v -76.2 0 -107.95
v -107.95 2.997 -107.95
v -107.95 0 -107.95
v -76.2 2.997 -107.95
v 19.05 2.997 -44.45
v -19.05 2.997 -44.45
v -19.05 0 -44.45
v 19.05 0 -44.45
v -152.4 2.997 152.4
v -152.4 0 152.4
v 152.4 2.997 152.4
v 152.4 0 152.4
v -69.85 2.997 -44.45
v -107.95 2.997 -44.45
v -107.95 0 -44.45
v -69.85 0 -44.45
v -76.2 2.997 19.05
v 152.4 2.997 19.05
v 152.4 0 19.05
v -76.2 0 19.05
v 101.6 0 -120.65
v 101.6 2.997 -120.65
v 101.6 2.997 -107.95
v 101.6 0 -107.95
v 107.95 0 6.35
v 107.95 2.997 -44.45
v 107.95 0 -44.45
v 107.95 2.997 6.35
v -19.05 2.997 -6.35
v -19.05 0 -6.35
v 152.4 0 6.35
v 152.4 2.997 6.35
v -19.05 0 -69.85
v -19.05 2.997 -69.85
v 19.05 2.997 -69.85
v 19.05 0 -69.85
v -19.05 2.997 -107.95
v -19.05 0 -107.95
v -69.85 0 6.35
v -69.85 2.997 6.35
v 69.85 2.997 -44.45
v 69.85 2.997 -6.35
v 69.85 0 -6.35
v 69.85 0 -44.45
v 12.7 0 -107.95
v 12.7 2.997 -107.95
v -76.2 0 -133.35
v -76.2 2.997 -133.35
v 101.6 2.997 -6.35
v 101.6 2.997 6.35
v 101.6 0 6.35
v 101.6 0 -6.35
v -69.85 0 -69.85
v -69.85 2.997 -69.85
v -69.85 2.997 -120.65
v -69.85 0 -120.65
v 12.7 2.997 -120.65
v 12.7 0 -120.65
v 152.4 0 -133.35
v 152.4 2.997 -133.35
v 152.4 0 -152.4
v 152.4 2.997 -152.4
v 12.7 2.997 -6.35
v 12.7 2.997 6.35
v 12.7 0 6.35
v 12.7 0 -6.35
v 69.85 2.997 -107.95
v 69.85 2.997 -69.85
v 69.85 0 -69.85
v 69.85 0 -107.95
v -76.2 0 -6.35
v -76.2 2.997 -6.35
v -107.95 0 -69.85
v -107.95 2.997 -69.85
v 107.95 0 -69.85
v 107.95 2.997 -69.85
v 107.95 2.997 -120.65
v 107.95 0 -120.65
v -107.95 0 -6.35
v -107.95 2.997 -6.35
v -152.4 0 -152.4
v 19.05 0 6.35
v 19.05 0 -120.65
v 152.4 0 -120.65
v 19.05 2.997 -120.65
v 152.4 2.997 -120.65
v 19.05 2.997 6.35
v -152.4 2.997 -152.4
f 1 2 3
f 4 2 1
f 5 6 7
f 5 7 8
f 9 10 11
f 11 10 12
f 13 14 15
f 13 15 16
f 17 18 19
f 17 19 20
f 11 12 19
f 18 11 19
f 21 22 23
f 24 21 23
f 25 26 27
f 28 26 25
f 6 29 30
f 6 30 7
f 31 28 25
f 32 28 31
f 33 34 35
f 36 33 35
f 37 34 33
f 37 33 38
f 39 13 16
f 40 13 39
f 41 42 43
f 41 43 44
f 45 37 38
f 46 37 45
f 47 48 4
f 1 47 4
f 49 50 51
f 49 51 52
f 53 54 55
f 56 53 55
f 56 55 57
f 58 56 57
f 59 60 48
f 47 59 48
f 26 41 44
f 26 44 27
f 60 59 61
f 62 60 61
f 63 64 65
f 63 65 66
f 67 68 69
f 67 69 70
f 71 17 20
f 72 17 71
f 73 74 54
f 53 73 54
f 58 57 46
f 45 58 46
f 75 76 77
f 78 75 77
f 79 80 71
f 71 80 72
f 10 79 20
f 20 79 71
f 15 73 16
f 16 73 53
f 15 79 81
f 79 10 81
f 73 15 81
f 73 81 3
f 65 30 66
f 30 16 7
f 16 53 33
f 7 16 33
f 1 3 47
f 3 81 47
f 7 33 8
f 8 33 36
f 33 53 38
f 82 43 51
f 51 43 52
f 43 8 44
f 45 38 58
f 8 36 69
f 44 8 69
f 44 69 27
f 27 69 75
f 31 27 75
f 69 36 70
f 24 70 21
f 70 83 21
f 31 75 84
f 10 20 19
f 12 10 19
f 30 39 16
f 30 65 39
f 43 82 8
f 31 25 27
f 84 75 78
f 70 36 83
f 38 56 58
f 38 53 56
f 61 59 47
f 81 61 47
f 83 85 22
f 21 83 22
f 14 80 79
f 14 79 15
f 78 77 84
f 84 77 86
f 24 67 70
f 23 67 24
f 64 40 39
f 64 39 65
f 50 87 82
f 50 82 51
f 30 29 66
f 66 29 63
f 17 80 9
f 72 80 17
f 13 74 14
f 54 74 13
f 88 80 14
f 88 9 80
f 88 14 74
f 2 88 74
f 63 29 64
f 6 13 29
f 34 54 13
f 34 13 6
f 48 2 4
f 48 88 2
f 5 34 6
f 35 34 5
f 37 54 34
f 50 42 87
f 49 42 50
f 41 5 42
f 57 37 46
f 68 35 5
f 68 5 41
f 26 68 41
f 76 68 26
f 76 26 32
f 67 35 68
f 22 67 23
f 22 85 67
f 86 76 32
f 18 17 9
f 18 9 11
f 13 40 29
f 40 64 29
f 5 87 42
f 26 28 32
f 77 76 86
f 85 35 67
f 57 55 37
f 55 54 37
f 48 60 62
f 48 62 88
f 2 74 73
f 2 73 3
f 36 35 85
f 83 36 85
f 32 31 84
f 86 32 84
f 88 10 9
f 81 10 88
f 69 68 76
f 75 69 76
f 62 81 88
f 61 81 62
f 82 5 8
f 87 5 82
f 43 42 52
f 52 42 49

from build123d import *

# Parameters (mm, degrees)
SKETCH1_W            = 304.8
SKETCH1_H            = 304.8
BOSS_EXTRUDE1_DEPTH  = 2.9972
SKETCH2_W            = 38.1
SKETCH2_H            = 38.1
CUT_EXTRUDE1_DEPTH   = 2.9972
LPATTERN1_COUNT      = 3
LPATTERN1_PITCH      = 88.9
LPATTERN1_COUNT_DIR2 = 2
LPATTERN1_PITCH_DIR2 = 63.5
CUT_EXTRUDE2_DEPTH   = 2.9972


with BuildPart() as part:
    # Sketch1 → Boss-Extrude1 (new body)
    with BuildSketch(Plane(origin=(0, 0, 0), x_dir=(1, 0, 0), z_dir=(0, 1, 0))):
        Rectangle(SKETCH1_W, SKETCH1_H)
    extrude(amount=BOSS_EXTRUDE1_DEPTH)

    # Sketch2 → Cut-Extrude1 (cut)
    with BuildSketch(Plane(origin=(0, 2.9972, 0), x_dir=(1, 0, 0), z_dir=(0, 1, 0))):
        with Locations((-88.9, 88.9)):
            Rectangle(SKETCH2_W, SKETCH2_H)
    cut_extrude1 = extrude(amount=-CUT_EXTRUDE1_DEPTH, mode=Mode.SUBTRACT)

    # LPattern1: Cut-Extrude1 3 × 2
    with Locations(*[(i * LPATTERN1_PITCH, 0, j * LPATTERN1_PITCH_DIR2) for i in range(LPATTERN1_COUNT) for j in range(LPATTERN1_COUNT_DIR2) if (i, j) != (0, 0)]):
        add(cut_extrude1, mode=Mode.SUBTRACT)

    # Sketch3 → Cut-Extrude2 (cut)
    with BuildSketch(Plane(origin=(0, 2.9972, 0), x_dir=(1, 0, 0), z_dir=(0, 1, 0))):
        Polygon((-69.85, 107.95), (-69.85, 120.65), (12.7, 120.65), (12.7, 107.95), (19.05, 107.95), (19.05, 120.65), (101.6, 120.65), (101.6, 107.95), (107.95, 107.95), (107.95, 120.65), (152.4, 120.65), (152.4, 133.35), (-76.2, 133.35), (-76.2, 107.95), align=None)
        Polygon((-69.85, 6.35), (-69.85, -6.35), (12.7, -6.35), (12.7, 6.35), (19.05, 6.35), (19.05, -6.35), (101.6, -6.35), (101.6, 6.35), (107.95, 6.35), (107.95, -6.35), (152.4, -6.35), (152.4, -19.05), (-76.2, -19.05), (-76.2, 6.35), align=None)
    extrude(amount=-CUT_EXTRUDE2_DEPTH, mode=Mode.SUBTRACT)


solid = part.part
